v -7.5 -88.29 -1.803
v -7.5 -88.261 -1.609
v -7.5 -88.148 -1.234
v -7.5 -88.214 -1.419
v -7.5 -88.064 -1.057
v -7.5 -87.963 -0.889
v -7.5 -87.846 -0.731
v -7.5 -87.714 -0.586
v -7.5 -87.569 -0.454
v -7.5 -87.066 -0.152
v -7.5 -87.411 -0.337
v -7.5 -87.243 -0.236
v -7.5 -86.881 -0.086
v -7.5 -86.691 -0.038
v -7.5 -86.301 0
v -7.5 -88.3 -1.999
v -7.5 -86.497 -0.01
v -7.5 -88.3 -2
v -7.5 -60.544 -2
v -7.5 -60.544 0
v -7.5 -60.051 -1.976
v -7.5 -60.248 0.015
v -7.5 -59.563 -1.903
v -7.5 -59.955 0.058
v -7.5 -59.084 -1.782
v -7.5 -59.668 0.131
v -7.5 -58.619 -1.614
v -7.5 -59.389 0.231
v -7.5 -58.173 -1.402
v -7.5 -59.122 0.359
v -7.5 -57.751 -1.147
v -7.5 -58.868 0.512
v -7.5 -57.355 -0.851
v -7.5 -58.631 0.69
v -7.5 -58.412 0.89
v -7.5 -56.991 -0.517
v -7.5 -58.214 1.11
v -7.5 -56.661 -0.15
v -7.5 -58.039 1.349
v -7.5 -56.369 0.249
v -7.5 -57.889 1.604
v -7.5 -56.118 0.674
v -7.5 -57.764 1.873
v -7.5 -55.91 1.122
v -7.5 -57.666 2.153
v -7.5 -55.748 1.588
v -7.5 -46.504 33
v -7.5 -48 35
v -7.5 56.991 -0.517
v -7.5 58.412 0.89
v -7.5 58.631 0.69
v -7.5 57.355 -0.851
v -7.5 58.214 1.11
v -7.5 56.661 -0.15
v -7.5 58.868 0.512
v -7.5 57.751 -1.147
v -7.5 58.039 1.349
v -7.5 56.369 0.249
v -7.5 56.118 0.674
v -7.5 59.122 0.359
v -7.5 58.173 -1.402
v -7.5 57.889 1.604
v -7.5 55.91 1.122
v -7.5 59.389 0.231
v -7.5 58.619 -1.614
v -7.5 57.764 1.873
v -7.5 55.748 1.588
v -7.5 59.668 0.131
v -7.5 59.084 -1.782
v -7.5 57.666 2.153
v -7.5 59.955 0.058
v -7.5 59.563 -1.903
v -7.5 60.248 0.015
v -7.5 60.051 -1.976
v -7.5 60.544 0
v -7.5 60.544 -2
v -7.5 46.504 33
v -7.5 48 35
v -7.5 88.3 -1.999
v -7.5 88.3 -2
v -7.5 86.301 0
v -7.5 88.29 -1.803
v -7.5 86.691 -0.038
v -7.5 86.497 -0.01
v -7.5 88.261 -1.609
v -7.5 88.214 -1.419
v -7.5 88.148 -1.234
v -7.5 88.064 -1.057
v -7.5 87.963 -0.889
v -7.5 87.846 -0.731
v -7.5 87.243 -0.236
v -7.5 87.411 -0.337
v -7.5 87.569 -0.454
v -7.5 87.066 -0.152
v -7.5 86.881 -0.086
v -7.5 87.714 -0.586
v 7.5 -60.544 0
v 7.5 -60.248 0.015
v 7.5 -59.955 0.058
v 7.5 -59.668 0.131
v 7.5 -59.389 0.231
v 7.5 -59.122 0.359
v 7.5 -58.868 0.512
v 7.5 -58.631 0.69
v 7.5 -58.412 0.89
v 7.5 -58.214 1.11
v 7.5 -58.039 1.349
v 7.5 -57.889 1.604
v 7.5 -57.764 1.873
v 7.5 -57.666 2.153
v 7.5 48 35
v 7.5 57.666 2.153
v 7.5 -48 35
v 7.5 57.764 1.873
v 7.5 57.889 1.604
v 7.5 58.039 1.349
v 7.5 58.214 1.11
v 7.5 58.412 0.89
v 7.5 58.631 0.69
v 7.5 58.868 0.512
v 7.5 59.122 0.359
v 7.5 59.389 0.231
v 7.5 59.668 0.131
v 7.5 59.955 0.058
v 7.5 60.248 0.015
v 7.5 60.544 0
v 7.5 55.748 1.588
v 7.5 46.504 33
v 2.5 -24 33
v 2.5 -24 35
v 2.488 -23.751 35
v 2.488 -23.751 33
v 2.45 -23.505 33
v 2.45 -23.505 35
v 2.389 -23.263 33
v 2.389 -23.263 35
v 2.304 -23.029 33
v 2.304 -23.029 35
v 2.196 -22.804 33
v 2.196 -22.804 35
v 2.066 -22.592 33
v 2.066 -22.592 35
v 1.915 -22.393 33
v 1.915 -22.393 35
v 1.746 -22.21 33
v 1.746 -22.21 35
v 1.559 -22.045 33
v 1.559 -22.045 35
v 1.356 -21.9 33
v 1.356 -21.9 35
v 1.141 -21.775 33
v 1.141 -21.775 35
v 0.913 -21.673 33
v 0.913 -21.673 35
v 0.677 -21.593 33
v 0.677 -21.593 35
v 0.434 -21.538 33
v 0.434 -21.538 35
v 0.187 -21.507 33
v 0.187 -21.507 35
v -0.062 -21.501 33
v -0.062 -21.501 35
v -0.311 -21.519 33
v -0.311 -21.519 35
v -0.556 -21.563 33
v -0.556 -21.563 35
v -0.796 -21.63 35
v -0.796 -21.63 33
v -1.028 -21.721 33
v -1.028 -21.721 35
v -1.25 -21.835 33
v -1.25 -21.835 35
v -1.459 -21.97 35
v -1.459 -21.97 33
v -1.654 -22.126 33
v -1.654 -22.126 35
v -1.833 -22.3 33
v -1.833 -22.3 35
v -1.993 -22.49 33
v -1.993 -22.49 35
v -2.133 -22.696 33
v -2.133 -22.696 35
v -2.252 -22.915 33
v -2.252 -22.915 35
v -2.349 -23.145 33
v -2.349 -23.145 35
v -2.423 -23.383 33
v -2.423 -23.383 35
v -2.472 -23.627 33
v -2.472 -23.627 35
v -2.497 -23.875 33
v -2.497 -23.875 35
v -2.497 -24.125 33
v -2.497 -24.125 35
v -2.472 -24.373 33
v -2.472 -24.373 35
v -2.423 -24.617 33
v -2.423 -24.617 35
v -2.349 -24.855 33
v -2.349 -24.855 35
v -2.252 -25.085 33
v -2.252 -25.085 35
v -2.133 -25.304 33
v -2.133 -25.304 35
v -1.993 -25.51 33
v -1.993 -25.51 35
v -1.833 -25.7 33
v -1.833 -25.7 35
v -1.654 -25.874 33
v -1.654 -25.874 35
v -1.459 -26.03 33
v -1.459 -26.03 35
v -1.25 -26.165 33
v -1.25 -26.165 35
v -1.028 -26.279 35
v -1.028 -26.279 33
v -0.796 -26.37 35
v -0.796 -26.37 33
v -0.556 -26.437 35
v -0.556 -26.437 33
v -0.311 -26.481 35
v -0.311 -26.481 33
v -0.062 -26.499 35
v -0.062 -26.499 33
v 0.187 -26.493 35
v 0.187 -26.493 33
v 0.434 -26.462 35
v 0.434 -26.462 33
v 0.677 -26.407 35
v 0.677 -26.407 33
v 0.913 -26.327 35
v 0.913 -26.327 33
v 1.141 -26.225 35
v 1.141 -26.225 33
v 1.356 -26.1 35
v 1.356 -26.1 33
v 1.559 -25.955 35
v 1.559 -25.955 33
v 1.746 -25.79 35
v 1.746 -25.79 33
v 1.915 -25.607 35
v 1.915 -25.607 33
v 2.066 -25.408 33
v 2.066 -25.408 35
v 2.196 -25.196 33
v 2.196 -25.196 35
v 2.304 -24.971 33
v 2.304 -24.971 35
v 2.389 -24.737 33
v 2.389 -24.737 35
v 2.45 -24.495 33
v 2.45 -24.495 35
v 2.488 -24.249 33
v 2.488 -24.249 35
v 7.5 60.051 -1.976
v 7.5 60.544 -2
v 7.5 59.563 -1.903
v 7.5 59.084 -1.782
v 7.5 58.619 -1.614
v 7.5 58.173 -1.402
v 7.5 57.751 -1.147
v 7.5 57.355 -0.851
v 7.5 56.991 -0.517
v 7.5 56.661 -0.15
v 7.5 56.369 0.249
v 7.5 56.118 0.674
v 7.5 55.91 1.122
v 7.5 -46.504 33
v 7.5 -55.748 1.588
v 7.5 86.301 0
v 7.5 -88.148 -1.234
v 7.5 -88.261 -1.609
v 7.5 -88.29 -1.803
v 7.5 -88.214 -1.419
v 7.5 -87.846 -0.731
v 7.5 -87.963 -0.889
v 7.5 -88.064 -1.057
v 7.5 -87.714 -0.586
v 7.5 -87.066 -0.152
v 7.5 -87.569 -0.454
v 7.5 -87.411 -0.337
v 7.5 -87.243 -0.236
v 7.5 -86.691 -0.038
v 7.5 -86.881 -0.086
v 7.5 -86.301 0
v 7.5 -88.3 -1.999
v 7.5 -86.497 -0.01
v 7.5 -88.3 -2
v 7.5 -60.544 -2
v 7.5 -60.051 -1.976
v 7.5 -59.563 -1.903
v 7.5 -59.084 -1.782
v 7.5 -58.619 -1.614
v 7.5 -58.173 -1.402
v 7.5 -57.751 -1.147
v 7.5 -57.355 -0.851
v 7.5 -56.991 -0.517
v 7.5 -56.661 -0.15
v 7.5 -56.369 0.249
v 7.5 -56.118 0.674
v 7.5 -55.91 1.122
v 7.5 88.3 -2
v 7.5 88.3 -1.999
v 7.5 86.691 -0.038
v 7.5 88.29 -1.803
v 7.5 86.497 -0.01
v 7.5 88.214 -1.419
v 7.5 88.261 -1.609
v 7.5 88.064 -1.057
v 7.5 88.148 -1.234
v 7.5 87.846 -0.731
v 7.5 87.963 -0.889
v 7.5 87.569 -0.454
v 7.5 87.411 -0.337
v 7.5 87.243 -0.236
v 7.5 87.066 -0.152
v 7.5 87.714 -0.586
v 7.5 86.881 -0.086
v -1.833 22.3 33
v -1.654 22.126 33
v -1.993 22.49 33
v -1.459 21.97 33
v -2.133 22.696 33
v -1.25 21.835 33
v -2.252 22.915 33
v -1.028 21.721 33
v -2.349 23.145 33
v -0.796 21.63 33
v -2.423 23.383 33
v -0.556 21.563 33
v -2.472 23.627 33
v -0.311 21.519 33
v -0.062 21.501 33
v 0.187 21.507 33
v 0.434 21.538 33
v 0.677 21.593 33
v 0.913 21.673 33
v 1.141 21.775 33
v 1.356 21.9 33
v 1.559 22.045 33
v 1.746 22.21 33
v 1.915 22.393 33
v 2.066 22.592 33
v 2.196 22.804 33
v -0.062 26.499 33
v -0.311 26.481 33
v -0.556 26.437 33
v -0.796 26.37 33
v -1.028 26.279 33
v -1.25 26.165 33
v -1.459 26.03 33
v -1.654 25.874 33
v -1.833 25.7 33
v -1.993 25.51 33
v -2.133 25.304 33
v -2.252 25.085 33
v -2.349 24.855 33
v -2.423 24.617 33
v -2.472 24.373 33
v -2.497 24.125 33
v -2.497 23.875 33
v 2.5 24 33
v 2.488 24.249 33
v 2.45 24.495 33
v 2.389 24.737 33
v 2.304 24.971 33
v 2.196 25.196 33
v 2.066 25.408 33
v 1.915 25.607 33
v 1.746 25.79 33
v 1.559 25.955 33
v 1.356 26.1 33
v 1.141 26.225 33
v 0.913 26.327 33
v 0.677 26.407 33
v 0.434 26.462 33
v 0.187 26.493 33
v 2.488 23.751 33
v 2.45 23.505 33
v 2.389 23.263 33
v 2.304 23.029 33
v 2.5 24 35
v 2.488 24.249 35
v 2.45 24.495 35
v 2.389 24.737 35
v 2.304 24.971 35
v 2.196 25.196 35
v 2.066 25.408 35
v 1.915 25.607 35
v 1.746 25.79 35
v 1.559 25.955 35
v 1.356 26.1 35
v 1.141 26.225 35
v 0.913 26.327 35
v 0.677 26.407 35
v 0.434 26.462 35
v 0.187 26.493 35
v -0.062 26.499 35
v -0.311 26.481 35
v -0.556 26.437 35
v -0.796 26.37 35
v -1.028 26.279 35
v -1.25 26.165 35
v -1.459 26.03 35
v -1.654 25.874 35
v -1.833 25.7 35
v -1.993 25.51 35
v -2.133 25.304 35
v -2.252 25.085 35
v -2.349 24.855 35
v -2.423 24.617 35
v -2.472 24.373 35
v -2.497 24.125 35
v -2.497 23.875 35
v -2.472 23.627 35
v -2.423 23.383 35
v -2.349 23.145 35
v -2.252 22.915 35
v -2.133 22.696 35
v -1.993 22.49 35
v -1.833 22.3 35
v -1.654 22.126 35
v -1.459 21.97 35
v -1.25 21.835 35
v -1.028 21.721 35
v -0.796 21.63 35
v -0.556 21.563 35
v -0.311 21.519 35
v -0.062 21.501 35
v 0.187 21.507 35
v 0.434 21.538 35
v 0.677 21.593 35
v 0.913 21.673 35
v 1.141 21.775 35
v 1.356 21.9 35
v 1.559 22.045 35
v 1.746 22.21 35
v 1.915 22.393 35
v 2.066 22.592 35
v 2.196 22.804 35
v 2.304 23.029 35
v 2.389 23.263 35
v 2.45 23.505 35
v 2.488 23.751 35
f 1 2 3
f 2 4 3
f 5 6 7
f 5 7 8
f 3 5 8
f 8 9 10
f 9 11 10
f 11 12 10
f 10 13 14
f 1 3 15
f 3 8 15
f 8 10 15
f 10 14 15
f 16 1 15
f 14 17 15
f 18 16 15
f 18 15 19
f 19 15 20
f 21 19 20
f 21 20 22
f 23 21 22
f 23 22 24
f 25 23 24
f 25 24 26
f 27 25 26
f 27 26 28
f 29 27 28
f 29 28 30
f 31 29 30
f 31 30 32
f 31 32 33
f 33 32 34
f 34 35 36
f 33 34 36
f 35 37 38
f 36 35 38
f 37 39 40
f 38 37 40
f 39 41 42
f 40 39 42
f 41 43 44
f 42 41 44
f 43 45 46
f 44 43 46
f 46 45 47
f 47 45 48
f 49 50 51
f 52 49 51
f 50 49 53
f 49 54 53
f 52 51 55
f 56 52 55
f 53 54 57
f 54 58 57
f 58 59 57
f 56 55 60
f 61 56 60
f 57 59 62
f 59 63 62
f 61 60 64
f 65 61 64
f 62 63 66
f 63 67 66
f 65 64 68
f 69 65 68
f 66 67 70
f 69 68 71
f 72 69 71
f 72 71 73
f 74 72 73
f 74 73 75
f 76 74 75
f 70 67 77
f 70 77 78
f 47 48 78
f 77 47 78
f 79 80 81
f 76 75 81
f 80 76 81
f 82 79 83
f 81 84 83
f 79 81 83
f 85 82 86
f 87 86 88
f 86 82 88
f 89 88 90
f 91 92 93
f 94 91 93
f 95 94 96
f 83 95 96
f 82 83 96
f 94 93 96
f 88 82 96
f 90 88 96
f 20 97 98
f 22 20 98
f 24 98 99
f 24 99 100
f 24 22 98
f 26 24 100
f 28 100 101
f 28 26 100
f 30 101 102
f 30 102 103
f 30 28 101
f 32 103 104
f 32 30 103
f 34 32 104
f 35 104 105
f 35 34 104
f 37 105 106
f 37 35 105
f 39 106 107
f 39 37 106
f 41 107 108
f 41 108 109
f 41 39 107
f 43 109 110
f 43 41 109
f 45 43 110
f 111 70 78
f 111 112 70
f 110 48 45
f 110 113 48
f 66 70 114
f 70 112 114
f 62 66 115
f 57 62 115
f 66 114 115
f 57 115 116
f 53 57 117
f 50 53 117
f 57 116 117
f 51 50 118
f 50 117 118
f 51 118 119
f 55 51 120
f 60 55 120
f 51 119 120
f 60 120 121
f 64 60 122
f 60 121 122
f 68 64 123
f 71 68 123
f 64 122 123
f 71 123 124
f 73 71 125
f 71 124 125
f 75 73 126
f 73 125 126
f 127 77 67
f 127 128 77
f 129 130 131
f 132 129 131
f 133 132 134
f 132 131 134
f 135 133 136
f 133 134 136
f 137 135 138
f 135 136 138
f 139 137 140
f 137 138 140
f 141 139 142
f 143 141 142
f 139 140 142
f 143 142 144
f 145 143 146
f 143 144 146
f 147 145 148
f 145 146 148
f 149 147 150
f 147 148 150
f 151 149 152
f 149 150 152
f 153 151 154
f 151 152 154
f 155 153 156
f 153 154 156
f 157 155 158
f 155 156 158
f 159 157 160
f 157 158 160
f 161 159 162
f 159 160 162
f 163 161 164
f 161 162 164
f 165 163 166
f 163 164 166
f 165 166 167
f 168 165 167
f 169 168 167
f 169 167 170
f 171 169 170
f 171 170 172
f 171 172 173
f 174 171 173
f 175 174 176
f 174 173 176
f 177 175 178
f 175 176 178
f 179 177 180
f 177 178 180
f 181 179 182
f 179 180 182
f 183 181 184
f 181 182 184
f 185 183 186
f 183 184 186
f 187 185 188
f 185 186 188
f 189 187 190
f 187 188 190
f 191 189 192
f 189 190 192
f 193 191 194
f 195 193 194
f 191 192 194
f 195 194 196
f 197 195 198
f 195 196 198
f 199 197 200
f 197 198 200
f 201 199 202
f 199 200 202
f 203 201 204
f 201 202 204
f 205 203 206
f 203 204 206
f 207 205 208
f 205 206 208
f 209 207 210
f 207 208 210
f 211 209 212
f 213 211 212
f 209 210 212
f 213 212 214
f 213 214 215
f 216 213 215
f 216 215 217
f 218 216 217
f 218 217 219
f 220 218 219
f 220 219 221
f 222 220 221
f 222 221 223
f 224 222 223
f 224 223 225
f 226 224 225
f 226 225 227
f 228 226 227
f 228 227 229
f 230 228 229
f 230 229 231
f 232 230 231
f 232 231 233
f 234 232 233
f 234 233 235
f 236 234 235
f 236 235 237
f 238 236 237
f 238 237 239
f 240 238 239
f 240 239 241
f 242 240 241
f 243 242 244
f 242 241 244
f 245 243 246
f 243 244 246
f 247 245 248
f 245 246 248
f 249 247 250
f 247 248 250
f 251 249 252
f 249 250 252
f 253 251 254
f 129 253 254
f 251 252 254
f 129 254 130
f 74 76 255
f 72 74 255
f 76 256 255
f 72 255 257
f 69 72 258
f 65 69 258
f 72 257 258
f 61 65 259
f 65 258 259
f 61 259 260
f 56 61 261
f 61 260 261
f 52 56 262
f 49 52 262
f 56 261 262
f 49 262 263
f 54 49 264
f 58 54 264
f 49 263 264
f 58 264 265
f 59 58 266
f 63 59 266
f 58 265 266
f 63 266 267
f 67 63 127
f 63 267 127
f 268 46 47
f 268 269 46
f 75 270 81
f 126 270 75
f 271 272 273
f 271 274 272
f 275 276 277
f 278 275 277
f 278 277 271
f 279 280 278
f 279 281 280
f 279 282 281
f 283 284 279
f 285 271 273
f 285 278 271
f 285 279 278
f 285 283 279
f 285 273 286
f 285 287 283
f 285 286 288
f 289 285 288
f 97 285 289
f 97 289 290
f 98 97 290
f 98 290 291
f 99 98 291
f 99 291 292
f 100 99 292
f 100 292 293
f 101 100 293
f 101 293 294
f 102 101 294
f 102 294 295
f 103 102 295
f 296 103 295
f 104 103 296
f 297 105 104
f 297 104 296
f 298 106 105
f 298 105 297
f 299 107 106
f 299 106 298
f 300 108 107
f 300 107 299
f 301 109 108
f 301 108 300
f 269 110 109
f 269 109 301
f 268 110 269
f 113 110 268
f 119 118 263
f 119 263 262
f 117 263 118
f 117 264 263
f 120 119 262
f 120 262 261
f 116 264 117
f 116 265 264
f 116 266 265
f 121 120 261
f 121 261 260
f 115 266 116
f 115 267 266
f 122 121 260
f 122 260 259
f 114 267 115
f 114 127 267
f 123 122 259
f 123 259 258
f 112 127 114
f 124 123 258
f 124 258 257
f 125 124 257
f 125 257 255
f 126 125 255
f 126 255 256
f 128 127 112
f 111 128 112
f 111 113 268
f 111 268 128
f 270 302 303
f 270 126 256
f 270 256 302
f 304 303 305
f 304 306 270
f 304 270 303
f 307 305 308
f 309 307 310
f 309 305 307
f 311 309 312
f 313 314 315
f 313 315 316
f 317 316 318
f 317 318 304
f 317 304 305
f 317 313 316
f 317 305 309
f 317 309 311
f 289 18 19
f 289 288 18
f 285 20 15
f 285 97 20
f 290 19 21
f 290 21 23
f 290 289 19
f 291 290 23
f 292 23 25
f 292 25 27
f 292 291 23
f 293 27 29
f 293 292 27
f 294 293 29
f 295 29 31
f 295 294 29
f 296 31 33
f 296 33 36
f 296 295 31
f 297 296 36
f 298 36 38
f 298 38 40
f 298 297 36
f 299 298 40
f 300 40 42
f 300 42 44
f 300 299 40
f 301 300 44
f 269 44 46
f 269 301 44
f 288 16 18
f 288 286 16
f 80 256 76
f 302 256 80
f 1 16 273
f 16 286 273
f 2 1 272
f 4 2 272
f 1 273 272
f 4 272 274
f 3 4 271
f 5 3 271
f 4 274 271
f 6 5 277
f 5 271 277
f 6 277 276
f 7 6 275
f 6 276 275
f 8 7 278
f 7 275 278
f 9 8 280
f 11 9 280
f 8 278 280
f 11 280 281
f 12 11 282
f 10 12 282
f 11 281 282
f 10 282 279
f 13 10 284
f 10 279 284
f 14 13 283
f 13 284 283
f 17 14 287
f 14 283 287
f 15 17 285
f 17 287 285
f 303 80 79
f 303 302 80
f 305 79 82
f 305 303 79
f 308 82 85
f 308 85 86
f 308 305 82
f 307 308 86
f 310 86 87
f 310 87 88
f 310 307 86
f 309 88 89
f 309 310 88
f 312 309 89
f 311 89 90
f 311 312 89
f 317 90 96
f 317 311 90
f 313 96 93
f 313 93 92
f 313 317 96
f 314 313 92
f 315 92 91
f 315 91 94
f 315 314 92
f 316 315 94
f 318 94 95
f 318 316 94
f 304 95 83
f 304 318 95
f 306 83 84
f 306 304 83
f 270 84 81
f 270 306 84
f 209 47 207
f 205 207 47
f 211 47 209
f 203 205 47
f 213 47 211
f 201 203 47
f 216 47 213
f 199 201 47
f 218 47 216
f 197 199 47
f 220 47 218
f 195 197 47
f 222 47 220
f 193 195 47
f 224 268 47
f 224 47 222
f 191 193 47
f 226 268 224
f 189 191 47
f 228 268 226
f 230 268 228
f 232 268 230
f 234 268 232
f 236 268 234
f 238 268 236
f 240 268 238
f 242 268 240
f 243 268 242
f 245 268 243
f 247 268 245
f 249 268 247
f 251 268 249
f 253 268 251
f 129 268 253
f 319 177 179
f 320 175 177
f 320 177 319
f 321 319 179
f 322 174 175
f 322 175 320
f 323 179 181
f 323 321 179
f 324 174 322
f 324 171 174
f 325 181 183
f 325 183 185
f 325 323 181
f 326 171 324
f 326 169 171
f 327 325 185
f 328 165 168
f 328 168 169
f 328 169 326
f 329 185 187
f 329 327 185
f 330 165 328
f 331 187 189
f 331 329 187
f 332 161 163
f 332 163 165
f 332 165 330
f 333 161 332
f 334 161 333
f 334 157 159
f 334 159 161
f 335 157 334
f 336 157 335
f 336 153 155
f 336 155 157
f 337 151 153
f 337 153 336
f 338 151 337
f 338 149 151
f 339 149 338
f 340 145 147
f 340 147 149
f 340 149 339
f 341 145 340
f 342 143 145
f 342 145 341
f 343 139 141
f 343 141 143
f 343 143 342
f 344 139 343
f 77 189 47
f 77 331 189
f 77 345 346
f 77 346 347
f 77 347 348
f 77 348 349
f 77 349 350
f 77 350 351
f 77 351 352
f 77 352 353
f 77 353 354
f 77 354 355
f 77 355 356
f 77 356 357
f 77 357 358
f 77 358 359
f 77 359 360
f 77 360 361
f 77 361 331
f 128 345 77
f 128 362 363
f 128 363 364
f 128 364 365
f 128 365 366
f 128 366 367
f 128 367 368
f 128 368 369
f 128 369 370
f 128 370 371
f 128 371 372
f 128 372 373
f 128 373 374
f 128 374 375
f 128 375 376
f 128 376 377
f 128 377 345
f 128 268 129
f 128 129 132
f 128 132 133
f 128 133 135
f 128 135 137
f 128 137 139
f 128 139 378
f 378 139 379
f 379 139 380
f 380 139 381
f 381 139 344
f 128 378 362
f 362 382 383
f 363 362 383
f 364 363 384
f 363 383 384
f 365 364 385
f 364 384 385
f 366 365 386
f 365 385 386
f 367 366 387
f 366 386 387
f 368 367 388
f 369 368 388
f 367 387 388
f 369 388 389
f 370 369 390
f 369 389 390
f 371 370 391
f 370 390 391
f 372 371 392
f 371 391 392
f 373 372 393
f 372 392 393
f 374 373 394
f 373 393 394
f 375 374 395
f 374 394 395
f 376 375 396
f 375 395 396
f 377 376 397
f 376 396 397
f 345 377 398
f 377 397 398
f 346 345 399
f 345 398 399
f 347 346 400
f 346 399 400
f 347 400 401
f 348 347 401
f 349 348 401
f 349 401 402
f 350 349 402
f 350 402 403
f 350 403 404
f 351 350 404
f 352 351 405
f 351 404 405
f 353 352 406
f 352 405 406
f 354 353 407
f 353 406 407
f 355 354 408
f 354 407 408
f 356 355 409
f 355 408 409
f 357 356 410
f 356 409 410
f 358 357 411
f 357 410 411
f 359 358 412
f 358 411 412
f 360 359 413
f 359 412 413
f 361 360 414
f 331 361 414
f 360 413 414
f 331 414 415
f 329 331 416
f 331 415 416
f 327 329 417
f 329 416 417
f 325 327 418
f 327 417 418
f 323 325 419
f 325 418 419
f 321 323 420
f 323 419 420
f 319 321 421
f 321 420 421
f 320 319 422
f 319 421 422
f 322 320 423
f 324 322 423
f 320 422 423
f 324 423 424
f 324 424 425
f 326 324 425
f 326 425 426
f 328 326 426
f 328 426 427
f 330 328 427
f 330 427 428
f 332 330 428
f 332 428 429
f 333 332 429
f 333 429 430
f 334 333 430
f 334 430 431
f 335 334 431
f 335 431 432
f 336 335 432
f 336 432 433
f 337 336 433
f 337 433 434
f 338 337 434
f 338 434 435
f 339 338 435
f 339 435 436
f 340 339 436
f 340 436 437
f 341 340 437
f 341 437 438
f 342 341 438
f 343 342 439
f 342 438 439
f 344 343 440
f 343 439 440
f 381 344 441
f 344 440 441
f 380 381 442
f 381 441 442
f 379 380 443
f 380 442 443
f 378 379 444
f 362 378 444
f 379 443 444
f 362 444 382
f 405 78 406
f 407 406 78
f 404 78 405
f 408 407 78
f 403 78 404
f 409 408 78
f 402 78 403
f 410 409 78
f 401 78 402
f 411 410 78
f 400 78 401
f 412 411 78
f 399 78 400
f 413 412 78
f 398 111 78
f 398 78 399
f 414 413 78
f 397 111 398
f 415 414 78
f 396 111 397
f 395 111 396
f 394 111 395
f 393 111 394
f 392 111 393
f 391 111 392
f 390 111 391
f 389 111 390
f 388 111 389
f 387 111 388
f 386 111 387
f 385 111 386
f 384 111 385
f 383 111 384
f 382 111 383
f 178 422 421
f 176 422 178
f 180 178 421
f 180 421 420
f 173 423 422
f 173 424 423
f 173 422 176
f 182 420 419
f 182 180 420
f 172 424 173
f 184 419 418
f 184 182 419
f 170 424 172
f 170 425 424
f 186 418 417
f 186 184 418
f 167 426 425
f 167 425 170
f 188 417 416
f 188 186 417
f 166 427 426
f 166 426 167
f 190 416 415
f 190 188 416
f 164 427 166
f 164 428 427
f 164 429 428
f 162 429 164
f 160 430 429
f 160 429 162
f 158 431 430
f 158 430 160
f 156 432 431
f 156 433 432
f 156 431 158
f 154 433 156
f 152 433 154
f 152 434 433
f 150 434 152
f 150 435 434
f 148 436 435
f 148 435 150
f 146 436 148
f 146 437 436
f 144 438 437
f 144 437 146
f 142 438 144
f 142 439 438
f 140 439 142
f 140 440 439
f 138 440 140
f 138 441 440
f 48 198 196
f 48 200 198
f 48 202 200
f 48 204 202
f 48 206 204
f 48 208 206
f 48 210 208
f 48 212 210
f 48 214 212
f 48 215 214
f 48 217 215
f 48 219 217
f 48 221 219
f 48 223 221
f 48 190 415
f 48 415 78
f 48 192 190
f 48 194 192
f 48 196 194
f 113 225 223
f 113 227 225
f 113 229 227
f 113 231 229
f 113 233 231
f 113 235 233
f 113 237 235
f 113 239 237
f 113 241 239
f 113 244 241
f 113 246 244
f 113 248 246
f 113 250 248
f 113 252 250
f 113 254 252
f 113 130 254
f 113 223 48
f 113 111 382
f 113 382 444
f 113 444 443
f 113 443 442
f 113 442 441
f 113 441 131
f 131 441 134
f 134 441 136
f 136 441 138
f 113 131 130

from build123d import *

# Parameters (mm, degrees)
F1_DEPTH = 7.5
F2_R     = 2.5
F3_DEPTH = 2
F4_R     = 5
F5_R     = 3
F6_R     = 3
F7_R     = 5
F8_R     = 1.999


# Not quite as in the source:
# - a fillet or chamfer is up to 0.001 mm smaller than in the source, because OpenCascade refuses the exact size


with BuildPart() as f1:
    # F0 (on Right) → F1 (new body, symmetric)
    with BuildSketch(Plane.YZ):
        Polygon((-58.3, 0), (-88.3, 0), (-88.2997653641, -2), (-56.8037653641, -2), (-46.5037653641, 33), (0, 33), (46.5037653641, 33), (56.8037653641, -2), (88.2997653641, -2), (88.3, 0), (58.3, 0), (48, 35), (0, 35), (-48, 35), align=None)
    extrude(amount=F1_DEPTH, both=True)

    # F2 (on face) → F3 (cut)
    with BuildSketch(Plane.XY.offset(35)):
        with Locations((0, -24)):
            Circle(F2_R)
        with Locations((0, 24)):
            Circle(F2_R)
    extrude(amount=-F3_DEPTH, mode=Mode.SUBTRACT)

    # F4
    f4_edges = [f1.edges().sort_by_distance(p)[0] for p in [
        (0, -56.803765, -2),
    ]]
    fillet(f4_edges, radius=F4_R)

    # F5
    f5_edges = [f1.edges().sort_by_distance(p)[0] for p in [
        (0, -58.3, 0),
    ]]
    fillet(f5_edges, radius=F5_R)

    # F6
    f6_edges = [f1.edges().sort_by_distance(p)[0] for p in [
        (0, 58.3, 0),
    ]]
    fillet(f6_edges, radius=F6_R)

    # F7
    f7_edges = [f1.edges().sort_by_distance(p)[0] for p in [
        (0, 56.803765, -2),
    ]]
    fillet(f7_edges, radius=F7_R)

    # F8 (radius 2 in the source; OpenCascade refuses exactly that, so slightly less here)
    f8_edges = [f1.edges().sort_by_distance(p)[0] for p in [
        (0, -88.3, 0),
        (0, 88.3, 0),
    ]]
    fillet(f8_edges, radius=F8_R)


solid = f1.part
